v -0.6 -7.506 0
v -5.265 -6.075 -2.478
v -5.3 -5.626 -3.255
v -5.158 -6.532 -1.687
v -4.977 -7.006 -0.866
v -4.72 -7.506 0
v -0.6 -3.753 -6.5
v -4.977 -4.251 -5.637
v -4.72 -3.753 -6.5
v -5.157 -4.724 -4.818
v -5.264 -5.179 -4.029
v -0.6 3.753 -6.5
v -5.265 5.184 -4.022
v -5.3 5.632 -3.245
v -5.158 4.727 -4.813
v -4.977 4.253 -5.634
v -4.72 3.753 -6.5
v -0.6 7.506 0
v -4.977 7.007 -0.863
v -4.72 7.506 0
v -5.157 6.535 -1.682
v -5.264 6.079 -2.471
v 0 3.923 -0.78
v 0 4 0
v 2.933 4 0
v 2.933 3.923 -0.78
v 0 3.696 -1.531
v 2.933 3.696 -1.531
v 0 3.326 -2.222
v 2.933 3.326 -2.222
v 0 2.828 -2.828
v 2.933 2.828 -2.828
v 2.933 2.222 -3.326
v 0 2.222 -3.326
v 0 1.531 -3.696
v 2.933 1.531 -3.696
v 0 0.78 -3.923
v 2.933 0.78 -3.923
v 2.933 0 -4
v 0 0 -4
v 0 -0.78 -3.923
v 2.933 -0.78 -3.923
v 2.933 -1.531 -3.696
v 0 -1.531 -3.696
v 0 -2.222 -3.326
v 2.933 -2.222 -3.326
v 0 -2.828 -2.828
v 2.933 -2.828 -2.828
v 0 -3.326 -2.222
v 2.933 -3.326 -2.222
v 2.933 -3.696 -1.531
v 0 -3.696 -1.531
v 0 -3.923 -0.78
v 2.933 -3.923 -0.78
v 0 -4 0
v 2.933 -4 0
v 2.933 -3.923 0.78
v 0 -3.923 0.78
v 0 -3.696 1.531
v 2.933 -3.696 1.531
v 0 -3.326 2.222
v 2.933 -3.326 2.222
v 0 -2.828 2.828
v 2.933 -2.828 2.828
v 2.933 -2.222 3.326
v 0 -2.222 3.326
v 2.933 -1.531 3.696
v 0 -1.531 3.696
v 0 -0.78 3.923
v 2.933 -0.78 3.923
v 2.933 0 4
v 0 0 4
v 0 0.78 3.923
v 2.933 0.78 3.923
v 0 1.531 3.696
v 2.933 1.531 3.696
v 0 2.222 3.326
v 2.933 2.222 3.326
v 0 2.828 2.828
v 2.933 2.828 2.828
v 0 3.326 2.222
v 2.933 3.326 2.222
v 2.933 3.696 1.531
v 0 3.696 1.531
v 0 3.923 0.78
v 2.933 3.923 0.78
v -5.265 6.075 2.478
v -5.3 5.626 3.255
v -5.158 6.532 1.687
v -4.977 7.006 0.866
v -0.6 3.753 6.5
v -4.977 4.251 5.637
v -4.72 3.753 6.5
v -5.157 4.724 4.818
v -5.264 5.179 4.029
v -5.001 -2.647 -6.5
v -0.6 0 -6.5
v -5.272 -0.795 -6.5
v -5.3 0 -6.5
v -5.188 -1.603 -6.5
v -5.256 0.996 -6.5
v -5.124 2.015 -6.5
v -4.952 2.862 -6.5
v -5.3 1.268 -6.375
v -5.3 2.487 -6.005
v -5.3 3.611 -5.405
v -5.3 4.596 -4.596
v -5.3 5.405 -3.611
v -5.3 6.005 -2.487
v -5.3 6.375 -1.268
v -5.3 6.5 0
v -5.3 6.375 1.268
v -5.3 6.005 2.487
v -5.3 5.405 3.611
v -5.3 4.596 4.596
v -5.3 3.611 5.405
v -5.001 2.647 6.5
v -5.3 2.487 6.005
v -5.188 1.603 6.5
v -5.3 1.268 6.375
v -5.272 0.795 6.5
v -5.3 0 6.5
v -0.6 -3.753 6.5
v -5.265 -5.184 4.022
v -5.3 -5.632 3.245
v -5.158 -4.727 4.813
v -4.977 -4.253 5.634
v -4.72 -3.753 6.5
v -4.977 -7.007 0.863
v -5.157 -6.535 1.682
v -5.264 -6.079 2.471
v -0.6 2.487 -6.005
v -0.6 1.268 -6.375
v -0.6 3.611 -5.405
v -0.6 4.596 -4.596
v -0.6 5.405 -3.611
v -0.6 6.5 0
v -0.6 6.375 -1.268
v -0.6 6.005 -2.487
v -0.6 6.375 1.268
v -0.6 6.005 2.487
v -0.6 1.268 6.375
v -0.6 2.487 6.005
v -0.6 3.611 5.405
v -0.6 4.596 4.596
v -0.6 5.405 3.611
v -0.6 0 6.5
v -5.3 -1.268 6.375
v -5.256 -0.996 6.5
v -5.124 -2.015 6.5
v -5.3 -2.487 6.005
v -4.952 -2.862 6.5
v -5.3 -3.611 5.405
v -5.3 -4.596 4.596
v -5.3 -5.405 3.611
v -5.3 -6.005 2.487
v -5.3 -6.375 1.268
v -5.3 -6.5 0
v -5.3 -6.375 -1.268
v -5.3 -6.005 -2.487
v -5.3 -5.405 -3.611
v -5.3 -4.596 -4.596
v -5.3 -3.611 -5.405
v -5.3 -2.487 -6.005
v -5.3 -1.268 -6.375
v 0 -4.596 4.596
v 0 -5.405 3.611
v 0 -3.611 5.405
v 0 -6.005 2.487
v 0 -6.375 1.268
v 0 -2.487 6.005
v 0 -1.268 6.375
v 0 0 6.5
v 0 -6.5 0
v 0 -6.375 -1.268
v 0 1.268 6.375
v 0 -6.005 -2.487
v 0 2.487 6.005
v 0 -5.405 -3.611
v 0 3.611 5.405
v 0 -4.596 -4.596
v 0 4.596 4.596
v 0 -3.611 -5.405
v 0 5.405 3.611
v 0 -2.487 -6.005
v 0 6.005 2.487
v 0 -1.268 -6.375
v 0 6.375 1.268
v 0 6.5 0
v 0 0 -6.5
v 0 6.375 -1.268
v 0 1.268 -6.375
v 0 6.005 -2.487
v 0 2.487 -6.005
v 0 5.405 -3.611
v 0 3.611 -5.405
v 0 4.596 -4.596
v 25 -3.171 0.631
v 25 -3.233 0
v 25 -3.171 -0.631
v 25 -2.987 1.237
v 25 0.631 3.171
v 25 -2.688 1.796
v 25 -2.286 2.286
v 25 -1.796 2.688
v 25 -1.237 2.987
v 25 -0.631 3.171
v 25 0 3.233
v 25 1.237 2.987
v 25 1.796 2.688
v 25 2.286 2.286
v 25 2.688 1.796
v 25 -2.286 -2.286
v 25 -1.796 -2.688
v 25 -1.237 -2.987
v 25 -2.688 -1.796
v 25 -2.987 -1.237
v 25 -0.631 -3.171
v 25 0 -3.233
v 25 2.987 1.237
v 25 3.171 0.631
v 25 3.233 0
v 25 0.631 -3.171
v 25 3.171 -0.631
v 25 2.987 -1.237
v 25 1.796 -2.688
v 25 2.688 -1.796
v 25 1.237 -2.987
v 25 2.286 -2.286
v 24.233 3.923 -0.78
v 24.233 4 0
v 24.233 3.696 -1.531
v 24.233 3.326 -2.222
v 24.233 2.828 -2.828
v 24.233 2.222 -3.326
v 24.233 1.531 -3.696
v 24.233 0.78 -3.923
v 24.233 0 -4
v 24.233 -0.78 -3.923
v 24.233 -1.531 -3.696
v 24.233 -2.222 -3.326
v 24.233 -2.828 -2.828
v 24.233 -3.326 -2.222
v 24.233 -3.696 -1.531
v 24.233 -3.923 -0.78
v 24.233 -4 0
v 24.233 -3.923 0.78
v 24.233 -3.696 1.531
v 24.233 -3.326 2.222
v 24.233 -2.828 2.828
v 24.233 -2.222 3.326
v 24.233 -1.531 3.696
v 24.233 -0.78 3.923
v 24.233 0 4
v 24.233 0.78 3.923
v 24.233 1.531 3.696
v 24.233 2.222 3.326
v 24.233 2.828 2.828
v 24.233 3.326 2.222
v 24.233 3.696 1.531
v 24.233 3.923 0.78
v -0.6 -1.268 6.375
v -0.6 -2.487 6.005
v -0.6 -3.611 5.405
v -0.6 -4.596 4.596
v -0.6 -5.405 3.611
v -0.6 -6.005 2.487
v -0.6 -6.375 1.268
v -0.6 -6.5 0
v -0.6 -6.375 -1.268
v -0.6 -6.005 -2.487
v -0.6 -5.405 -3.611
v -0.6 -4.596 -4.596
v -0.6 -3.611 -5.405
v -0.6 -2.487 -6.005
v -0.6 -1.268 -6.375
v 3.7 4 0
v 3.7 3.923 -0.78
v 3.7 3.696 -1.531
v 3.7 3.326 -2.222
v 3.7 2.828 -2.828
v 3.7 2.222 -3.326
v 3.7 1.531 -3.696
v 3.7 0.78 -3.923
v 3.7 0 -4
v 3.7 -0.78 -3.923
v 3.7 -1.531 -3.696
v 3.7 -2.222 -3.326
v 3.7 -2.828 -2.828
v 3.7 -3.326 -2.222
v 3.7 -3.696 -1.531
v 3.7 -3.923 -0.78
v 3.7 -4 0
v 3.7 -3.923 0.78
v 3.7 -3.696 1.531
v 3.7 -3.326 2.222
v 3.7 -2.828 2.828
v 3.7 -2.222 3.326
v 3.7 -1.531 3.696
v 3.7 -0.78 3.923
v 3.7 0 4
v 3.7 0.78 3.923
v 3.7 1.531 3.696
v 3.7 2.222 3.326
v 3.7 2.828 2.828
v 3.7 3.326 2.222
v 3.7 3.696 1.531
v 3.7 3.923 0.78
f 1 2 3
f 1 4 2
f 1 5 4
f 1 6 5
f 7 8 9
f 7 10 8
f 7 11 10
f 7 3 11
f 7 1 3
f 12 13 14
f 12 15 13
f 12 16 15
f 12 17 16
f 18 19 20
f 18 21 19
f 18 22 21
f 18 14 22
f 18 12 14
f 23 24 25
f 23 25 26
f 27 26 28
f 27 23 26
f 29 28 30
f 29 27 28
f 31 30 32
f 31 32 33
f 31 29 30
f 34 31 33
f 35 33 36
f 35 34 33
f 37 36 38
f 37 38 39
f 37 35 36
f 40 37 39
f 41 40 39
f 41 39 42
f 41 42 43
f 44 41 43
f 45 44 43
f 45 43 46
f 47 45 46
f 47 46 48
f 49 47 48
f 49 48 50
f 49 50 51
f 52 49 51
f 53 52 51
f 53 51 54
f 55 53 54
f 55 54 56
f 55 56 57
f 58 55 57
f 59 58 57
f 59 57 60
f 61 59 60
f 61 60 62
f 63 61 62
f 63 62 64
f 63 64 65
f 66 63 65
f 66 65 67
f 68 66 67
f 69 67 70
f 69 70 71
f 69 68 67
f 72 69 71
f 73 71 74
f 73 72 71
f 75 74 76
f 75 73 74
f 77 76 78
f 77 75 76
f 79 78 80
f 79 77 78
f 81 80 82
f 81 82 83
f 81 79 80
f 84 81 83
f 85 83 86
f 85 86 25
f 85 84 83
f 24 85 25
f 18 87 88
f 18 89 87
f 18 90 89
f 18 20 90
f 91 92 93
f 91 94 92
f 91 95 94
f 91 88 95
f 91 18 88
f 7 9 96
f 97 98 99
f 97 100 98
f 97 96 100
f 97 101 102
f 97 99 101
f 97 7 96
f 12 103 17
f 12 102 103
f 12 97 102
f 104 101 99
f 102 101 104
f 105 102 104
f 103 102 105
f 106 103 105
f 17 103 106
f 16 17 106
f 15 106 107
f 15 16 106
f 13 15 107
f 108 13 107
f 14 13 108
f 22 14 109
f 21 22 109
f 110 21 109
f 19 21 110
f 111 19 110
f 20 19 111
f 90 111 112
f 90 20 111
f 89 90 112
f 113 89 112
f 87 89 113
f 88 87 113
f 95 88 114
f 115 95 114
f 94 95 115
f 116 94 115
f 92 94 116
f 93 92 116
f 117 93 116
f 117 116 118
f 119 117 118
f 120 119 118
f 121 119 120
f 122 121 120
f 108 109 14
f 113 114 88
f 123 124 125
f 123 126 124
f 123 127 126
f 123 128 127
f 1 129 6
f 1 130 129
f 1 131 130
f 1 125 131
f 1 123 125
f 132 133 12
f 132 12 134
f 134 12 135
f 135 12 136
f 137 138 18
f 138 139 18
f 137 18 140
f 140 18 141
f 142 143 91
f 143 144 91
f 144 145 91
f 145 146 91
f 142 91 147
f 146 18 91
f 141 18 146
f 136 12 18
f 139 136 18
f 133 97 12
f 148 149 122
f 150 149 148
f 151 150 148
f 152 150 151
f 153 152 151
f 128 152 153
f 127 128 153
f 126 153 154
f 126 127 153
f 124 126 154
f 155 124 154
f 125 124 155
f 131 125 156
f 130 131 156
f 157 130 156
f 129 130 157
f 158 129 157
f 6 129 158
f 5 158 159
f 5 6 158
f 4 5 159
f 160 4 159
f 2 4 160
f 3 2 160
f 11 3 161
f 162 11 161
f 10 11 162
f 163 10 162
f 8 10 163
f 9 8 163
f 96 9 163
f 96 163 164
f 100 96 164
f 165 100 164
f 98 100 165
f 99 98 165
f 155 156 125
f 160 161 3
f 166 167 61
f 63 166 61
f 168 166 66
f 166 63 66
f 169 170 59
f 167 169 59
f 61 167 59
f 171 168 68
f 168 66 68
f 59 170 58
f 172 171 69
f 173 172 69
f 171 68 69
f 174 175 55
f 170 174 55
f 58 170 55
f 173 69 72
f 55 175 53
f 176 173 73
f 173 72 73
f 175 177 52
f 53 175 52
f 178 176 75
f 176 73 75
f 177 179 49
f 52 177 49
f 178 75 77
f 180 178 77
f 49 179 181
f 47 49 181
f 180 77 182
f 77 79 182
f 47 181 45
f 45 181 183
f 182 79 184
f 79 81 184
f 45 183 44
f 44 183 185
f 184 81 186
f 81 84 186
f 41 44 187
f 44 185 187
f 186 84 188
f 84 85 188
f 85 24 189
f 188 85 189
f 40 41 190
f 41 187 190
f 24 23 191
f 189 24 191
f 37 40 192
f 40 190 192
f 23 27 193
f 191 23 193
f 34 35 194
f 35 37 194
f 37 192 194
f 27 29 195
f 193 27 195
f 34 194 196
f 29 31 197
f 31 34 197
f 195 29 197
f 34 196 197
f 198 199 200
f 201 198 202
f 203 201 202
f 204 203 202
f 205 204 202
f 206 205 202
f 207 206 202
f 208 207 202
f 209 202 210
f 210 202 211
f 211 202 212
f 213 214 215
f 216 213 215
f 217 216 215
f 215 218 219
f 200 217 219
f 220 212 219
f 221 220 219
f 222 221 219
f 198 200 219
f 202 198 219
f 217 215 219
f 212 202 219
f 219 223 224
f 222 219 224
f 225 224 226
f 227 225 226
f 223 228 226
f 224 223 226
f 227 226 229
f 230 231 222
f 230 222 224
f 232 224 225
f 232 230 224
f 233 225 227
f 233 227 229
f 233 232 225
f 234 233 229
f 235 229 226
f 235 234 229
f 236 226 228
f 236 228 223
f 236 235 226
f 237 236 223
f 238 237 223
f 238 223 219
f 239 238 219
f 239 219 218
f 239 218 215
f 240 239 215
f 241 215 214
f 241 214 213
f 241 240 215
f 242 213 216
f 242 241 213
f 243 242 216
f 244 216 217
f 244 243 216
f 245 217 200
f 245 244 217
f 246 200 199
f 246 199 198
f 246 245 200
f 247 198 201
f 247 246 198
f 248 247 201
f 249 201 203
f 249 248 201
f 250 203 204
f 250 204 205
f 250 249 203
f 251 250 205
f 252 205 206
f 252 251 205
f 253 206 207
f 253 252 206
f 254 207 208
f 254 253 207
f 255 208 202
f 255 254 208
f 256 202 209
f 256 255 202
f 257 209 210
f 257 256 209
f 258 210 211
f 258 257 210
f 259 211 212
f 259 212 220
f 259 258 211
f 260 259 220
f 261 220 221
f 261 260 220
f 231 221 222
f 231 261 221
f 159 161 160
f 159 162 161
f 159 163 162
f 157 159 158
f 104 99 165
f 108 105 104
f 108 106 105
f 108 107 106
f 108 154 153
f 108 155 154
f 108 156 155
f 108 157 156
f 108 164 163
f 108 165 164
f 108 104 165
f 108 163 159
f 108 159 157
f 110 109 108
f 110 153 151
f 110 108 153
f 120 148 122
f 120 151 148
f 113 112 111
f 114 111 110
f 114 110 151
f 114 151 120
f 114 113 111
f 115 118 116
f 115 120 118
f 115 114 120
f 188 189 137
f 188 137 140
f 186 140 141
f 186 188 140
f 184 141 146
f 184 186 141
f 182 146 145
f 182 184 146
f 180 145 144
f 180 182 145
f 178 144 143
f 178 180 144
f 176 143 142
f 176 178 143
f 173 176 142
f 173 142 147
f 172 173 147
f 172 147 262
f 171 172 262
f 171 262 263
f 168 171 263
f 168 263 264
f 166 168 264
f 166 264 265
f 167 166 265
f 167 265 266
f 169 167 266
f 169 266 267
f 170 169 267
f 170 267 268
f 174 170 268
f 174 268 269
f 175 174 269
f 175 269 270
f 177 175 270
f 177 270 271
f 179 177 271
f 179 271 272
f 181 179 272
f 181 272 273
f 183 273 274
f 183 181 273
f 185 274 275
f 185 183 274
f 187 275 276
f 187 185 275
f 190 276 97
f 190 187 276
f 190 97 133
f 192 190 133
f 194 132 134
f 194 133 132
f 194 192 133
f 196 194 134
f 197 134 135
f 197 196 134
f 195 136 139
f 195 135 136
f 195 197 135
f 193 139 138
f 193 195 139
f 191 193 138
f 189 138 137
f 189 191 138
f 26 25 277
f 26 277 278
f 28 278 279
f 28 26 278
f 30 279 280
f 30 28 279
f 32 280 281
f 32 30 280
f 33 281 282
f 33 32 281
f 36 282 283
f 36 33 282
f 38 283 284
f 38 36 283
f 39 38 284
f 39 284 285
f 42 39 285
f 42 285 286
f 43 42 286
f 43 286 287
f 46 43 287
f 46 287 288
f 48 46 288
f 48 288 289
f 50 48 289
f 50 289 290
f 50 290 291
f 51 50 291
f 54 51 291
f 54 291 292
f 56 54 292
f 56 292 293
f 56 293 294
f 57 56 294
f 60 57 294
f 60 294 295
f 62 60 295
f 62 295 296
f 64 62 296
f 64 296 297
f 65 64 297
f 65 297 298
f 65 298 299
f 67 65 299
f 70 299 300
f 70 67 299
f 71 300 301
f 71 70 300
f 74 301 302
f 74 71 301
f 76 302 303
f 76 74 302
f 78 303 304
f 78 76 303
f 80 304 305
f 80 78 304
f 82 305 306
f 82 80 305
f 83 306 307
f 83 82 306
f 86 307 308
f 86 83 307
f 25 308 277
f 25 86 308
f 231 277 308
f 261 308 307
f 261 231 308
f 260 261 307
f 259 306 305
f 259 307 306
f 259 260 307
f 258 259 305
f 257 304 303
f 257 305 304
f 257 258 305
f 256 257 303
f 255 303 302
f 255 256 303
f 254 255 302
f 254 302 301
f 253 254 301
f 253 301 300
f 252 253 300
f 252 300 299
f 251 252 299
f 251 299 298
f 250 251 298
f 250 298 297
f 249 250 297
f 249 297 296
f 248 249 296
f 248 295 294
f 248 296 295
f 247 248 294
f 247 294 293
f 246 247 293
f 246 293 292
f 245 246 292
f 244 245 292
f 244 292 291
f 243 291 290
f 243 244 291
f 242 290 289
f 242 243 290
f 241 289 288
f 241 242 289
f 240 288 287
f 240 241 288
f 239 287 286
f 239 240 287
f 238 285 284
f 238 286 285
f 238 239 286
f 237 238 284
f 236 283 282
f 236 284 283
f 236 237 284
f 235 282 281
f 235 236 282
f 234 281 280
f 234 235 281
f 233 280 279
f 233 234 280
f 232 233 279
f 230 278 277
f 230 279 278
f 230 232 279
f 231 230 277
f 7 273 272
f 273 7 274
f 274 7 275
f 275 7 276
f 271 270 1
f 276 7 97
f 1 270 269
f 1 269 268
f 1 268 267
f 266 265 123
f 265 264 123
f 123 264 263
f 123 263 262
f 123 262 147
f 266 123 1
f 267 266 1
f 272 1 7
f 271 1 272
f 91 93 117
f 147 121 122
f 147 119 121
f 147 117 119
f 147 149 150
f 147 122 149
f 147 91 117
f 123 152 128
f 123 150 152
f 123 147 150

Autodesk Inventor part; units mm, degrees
ref_plane "YZ Plane" through (0, 0, 0) normal (1, 0, 0) x (0, 1, 0)
ref_plane "XZ Plane" through (0, 0, 0) normal (0, 1, 0) x (-1, 0, 0)
sketch "Sketch1" plane through (0, 0, 0) normal (0, 0, 1) x (1, 0, 0)
  line L0 (0, 6.5) -> (0, 4)
  line L1 (3.7, 4) -> (25, 4)
  line L2 (25, 4) -> (25, 0)
  line L3 (25, 0) -> (-0.6001, 0)
  line L4 (-5.7201, 0) -> (30.12, 0) projected
  line L5 (-0.6001, 0) -> (-0.6001, 6.5)
  line L6 (-0.6001, 6.5) -> (0, 6.5)
  line L7 (3.7, 4) -> (2.9331, 4)
  line L8 (2.9331, 4) -> (0, 4)
  line L9 (0, -1.3) -> (0, 7.8) projected
  dimension "d0" = 25
  dimension "d1" = 21.3
  dimension "d2" = 8
  dimension "d9" = 0.6001
  dimension "d10" = 13
  dimension "d13" = 0.7669
  dimension "d14" = 8
revolve "Body" add sketch "Sketch1" angle 360 about axis through (25, 0, 0) along (-1, 0, 0)
sketch "Sketch2" plane through (-0.6001, 0, 0) normal (-1, 0, 0) x (0, 0, 1)
  line L0 (0, 7.5056) -> (6.5, 3.7528)
  line L1 (6.5, 3.7528) -> (6.5, -3.7528)
  line L2 (6.5, -3.7528) -> (0, -7.5056)
  line L3 (0, -7.5056) -> (-6.5, -3.7528)
  line L4 (-6.5, -3.7528) -> (-6.5, 3.7528)
  line L5 (-6.5, 3.7528) -> (0, 7.5056)
  point P0 (0, 0)
  point P1 (0, 0)
  dimension "d11" = 13
extrude "Head" add sketch "Sketch2" along normal blind 4.7
sketch "Sketch4" plane through (0, 0, 0) normal (0, 0, 1) x (1, 0, 0)
  line L0 (-5.3001, 6.5) -> (-5.3001, 7.5056)
  line L1 (-5.3001, 7.5056) -> (-4.7195, 7.5056)
  line L2 (-4.7195, 7.5056) -> (-5.3001, 6.5)
  line L3 (-6.2401, 0) -> (0.3399, 0) projected
  line L4 (-0.6001, 7.5056) -> (-5.3001, 7.5056) projected
  line L5 (-5.3001, 3.7528) -> (-5.3001, 7.5056) projected
  dimension "d5" = 30
  dimension "d19" = 13
revolve "Chamfer1" cut sketch "Sketch4" angle 360 about axis through (-10, 0, 0) along (1, 0, 0)
thread "Thread" size "M8x1.25" class "6g" standard "ISO Metric profile" length 21.3
chamfer "Chamfer2" distance 0.7668 distance2 0.7669 1 edges at (25, -4, 0) measured on face at (25, 0.998, -0.8842)
ref_plane "Work Plane1" through (1.525, 0, 0) normal (0, 0, 1) x (1, 0, 0)
equation "\"d0\" = NLG"
equation "\"d1\" = GEL"
equation "\"d2\" = GD"
equation "\"d10\" = SD2"
equation "\"d14\" = BDM"
equation "\"d11\" = SW"
equation "\"d3\" = KOH - SD"
equation "\"d5\" = ANG1"
equation "\"d19\" = SW0"
equation "\"d15\" = GEL"
equation "\"d6\" = -0.5 * SPD + 0.5 * GD"
equation "\"NLG\" = 25"
equation "\"GD\" = NND"
equation "\"BDM\" = NND"
equation "\"KOH\" = 5.3"
equation "\"GEL\" = 21.3"
equation "\"SW\" = 13"
equation "\"SW0\" = SW"
equation "\"SPD\" = NND - 1.2269 * PTC"
equation "\"SD2\" = SW"
equation "\"SD\" = 0.6"
equation "\"ANG1\" = 30deg"
equation "\"GAL\" = 0.61345 * PTC"
equation "\"GUL\" = 0.61345 * PTC"
equation "\"RR\" = 0.4"
equation "\"WFT\" = SD"
equation "\"GD1\" = THREADDIA - 1.2269 * PTC"
equation "\"THREADDIA\" = 8"
equation "\"SDH\" = SW"
equation "\"TOA\" = 30deg"
equation "\"FAWI\" = 45deg"
equation "\"PTC\" = 1.25"
equation "\"NND\" = 8"
equation "\"E0\" = 1.155 * SW"
properties part number "AS 1110 - M8 x 25" material "Steel, Mild"
